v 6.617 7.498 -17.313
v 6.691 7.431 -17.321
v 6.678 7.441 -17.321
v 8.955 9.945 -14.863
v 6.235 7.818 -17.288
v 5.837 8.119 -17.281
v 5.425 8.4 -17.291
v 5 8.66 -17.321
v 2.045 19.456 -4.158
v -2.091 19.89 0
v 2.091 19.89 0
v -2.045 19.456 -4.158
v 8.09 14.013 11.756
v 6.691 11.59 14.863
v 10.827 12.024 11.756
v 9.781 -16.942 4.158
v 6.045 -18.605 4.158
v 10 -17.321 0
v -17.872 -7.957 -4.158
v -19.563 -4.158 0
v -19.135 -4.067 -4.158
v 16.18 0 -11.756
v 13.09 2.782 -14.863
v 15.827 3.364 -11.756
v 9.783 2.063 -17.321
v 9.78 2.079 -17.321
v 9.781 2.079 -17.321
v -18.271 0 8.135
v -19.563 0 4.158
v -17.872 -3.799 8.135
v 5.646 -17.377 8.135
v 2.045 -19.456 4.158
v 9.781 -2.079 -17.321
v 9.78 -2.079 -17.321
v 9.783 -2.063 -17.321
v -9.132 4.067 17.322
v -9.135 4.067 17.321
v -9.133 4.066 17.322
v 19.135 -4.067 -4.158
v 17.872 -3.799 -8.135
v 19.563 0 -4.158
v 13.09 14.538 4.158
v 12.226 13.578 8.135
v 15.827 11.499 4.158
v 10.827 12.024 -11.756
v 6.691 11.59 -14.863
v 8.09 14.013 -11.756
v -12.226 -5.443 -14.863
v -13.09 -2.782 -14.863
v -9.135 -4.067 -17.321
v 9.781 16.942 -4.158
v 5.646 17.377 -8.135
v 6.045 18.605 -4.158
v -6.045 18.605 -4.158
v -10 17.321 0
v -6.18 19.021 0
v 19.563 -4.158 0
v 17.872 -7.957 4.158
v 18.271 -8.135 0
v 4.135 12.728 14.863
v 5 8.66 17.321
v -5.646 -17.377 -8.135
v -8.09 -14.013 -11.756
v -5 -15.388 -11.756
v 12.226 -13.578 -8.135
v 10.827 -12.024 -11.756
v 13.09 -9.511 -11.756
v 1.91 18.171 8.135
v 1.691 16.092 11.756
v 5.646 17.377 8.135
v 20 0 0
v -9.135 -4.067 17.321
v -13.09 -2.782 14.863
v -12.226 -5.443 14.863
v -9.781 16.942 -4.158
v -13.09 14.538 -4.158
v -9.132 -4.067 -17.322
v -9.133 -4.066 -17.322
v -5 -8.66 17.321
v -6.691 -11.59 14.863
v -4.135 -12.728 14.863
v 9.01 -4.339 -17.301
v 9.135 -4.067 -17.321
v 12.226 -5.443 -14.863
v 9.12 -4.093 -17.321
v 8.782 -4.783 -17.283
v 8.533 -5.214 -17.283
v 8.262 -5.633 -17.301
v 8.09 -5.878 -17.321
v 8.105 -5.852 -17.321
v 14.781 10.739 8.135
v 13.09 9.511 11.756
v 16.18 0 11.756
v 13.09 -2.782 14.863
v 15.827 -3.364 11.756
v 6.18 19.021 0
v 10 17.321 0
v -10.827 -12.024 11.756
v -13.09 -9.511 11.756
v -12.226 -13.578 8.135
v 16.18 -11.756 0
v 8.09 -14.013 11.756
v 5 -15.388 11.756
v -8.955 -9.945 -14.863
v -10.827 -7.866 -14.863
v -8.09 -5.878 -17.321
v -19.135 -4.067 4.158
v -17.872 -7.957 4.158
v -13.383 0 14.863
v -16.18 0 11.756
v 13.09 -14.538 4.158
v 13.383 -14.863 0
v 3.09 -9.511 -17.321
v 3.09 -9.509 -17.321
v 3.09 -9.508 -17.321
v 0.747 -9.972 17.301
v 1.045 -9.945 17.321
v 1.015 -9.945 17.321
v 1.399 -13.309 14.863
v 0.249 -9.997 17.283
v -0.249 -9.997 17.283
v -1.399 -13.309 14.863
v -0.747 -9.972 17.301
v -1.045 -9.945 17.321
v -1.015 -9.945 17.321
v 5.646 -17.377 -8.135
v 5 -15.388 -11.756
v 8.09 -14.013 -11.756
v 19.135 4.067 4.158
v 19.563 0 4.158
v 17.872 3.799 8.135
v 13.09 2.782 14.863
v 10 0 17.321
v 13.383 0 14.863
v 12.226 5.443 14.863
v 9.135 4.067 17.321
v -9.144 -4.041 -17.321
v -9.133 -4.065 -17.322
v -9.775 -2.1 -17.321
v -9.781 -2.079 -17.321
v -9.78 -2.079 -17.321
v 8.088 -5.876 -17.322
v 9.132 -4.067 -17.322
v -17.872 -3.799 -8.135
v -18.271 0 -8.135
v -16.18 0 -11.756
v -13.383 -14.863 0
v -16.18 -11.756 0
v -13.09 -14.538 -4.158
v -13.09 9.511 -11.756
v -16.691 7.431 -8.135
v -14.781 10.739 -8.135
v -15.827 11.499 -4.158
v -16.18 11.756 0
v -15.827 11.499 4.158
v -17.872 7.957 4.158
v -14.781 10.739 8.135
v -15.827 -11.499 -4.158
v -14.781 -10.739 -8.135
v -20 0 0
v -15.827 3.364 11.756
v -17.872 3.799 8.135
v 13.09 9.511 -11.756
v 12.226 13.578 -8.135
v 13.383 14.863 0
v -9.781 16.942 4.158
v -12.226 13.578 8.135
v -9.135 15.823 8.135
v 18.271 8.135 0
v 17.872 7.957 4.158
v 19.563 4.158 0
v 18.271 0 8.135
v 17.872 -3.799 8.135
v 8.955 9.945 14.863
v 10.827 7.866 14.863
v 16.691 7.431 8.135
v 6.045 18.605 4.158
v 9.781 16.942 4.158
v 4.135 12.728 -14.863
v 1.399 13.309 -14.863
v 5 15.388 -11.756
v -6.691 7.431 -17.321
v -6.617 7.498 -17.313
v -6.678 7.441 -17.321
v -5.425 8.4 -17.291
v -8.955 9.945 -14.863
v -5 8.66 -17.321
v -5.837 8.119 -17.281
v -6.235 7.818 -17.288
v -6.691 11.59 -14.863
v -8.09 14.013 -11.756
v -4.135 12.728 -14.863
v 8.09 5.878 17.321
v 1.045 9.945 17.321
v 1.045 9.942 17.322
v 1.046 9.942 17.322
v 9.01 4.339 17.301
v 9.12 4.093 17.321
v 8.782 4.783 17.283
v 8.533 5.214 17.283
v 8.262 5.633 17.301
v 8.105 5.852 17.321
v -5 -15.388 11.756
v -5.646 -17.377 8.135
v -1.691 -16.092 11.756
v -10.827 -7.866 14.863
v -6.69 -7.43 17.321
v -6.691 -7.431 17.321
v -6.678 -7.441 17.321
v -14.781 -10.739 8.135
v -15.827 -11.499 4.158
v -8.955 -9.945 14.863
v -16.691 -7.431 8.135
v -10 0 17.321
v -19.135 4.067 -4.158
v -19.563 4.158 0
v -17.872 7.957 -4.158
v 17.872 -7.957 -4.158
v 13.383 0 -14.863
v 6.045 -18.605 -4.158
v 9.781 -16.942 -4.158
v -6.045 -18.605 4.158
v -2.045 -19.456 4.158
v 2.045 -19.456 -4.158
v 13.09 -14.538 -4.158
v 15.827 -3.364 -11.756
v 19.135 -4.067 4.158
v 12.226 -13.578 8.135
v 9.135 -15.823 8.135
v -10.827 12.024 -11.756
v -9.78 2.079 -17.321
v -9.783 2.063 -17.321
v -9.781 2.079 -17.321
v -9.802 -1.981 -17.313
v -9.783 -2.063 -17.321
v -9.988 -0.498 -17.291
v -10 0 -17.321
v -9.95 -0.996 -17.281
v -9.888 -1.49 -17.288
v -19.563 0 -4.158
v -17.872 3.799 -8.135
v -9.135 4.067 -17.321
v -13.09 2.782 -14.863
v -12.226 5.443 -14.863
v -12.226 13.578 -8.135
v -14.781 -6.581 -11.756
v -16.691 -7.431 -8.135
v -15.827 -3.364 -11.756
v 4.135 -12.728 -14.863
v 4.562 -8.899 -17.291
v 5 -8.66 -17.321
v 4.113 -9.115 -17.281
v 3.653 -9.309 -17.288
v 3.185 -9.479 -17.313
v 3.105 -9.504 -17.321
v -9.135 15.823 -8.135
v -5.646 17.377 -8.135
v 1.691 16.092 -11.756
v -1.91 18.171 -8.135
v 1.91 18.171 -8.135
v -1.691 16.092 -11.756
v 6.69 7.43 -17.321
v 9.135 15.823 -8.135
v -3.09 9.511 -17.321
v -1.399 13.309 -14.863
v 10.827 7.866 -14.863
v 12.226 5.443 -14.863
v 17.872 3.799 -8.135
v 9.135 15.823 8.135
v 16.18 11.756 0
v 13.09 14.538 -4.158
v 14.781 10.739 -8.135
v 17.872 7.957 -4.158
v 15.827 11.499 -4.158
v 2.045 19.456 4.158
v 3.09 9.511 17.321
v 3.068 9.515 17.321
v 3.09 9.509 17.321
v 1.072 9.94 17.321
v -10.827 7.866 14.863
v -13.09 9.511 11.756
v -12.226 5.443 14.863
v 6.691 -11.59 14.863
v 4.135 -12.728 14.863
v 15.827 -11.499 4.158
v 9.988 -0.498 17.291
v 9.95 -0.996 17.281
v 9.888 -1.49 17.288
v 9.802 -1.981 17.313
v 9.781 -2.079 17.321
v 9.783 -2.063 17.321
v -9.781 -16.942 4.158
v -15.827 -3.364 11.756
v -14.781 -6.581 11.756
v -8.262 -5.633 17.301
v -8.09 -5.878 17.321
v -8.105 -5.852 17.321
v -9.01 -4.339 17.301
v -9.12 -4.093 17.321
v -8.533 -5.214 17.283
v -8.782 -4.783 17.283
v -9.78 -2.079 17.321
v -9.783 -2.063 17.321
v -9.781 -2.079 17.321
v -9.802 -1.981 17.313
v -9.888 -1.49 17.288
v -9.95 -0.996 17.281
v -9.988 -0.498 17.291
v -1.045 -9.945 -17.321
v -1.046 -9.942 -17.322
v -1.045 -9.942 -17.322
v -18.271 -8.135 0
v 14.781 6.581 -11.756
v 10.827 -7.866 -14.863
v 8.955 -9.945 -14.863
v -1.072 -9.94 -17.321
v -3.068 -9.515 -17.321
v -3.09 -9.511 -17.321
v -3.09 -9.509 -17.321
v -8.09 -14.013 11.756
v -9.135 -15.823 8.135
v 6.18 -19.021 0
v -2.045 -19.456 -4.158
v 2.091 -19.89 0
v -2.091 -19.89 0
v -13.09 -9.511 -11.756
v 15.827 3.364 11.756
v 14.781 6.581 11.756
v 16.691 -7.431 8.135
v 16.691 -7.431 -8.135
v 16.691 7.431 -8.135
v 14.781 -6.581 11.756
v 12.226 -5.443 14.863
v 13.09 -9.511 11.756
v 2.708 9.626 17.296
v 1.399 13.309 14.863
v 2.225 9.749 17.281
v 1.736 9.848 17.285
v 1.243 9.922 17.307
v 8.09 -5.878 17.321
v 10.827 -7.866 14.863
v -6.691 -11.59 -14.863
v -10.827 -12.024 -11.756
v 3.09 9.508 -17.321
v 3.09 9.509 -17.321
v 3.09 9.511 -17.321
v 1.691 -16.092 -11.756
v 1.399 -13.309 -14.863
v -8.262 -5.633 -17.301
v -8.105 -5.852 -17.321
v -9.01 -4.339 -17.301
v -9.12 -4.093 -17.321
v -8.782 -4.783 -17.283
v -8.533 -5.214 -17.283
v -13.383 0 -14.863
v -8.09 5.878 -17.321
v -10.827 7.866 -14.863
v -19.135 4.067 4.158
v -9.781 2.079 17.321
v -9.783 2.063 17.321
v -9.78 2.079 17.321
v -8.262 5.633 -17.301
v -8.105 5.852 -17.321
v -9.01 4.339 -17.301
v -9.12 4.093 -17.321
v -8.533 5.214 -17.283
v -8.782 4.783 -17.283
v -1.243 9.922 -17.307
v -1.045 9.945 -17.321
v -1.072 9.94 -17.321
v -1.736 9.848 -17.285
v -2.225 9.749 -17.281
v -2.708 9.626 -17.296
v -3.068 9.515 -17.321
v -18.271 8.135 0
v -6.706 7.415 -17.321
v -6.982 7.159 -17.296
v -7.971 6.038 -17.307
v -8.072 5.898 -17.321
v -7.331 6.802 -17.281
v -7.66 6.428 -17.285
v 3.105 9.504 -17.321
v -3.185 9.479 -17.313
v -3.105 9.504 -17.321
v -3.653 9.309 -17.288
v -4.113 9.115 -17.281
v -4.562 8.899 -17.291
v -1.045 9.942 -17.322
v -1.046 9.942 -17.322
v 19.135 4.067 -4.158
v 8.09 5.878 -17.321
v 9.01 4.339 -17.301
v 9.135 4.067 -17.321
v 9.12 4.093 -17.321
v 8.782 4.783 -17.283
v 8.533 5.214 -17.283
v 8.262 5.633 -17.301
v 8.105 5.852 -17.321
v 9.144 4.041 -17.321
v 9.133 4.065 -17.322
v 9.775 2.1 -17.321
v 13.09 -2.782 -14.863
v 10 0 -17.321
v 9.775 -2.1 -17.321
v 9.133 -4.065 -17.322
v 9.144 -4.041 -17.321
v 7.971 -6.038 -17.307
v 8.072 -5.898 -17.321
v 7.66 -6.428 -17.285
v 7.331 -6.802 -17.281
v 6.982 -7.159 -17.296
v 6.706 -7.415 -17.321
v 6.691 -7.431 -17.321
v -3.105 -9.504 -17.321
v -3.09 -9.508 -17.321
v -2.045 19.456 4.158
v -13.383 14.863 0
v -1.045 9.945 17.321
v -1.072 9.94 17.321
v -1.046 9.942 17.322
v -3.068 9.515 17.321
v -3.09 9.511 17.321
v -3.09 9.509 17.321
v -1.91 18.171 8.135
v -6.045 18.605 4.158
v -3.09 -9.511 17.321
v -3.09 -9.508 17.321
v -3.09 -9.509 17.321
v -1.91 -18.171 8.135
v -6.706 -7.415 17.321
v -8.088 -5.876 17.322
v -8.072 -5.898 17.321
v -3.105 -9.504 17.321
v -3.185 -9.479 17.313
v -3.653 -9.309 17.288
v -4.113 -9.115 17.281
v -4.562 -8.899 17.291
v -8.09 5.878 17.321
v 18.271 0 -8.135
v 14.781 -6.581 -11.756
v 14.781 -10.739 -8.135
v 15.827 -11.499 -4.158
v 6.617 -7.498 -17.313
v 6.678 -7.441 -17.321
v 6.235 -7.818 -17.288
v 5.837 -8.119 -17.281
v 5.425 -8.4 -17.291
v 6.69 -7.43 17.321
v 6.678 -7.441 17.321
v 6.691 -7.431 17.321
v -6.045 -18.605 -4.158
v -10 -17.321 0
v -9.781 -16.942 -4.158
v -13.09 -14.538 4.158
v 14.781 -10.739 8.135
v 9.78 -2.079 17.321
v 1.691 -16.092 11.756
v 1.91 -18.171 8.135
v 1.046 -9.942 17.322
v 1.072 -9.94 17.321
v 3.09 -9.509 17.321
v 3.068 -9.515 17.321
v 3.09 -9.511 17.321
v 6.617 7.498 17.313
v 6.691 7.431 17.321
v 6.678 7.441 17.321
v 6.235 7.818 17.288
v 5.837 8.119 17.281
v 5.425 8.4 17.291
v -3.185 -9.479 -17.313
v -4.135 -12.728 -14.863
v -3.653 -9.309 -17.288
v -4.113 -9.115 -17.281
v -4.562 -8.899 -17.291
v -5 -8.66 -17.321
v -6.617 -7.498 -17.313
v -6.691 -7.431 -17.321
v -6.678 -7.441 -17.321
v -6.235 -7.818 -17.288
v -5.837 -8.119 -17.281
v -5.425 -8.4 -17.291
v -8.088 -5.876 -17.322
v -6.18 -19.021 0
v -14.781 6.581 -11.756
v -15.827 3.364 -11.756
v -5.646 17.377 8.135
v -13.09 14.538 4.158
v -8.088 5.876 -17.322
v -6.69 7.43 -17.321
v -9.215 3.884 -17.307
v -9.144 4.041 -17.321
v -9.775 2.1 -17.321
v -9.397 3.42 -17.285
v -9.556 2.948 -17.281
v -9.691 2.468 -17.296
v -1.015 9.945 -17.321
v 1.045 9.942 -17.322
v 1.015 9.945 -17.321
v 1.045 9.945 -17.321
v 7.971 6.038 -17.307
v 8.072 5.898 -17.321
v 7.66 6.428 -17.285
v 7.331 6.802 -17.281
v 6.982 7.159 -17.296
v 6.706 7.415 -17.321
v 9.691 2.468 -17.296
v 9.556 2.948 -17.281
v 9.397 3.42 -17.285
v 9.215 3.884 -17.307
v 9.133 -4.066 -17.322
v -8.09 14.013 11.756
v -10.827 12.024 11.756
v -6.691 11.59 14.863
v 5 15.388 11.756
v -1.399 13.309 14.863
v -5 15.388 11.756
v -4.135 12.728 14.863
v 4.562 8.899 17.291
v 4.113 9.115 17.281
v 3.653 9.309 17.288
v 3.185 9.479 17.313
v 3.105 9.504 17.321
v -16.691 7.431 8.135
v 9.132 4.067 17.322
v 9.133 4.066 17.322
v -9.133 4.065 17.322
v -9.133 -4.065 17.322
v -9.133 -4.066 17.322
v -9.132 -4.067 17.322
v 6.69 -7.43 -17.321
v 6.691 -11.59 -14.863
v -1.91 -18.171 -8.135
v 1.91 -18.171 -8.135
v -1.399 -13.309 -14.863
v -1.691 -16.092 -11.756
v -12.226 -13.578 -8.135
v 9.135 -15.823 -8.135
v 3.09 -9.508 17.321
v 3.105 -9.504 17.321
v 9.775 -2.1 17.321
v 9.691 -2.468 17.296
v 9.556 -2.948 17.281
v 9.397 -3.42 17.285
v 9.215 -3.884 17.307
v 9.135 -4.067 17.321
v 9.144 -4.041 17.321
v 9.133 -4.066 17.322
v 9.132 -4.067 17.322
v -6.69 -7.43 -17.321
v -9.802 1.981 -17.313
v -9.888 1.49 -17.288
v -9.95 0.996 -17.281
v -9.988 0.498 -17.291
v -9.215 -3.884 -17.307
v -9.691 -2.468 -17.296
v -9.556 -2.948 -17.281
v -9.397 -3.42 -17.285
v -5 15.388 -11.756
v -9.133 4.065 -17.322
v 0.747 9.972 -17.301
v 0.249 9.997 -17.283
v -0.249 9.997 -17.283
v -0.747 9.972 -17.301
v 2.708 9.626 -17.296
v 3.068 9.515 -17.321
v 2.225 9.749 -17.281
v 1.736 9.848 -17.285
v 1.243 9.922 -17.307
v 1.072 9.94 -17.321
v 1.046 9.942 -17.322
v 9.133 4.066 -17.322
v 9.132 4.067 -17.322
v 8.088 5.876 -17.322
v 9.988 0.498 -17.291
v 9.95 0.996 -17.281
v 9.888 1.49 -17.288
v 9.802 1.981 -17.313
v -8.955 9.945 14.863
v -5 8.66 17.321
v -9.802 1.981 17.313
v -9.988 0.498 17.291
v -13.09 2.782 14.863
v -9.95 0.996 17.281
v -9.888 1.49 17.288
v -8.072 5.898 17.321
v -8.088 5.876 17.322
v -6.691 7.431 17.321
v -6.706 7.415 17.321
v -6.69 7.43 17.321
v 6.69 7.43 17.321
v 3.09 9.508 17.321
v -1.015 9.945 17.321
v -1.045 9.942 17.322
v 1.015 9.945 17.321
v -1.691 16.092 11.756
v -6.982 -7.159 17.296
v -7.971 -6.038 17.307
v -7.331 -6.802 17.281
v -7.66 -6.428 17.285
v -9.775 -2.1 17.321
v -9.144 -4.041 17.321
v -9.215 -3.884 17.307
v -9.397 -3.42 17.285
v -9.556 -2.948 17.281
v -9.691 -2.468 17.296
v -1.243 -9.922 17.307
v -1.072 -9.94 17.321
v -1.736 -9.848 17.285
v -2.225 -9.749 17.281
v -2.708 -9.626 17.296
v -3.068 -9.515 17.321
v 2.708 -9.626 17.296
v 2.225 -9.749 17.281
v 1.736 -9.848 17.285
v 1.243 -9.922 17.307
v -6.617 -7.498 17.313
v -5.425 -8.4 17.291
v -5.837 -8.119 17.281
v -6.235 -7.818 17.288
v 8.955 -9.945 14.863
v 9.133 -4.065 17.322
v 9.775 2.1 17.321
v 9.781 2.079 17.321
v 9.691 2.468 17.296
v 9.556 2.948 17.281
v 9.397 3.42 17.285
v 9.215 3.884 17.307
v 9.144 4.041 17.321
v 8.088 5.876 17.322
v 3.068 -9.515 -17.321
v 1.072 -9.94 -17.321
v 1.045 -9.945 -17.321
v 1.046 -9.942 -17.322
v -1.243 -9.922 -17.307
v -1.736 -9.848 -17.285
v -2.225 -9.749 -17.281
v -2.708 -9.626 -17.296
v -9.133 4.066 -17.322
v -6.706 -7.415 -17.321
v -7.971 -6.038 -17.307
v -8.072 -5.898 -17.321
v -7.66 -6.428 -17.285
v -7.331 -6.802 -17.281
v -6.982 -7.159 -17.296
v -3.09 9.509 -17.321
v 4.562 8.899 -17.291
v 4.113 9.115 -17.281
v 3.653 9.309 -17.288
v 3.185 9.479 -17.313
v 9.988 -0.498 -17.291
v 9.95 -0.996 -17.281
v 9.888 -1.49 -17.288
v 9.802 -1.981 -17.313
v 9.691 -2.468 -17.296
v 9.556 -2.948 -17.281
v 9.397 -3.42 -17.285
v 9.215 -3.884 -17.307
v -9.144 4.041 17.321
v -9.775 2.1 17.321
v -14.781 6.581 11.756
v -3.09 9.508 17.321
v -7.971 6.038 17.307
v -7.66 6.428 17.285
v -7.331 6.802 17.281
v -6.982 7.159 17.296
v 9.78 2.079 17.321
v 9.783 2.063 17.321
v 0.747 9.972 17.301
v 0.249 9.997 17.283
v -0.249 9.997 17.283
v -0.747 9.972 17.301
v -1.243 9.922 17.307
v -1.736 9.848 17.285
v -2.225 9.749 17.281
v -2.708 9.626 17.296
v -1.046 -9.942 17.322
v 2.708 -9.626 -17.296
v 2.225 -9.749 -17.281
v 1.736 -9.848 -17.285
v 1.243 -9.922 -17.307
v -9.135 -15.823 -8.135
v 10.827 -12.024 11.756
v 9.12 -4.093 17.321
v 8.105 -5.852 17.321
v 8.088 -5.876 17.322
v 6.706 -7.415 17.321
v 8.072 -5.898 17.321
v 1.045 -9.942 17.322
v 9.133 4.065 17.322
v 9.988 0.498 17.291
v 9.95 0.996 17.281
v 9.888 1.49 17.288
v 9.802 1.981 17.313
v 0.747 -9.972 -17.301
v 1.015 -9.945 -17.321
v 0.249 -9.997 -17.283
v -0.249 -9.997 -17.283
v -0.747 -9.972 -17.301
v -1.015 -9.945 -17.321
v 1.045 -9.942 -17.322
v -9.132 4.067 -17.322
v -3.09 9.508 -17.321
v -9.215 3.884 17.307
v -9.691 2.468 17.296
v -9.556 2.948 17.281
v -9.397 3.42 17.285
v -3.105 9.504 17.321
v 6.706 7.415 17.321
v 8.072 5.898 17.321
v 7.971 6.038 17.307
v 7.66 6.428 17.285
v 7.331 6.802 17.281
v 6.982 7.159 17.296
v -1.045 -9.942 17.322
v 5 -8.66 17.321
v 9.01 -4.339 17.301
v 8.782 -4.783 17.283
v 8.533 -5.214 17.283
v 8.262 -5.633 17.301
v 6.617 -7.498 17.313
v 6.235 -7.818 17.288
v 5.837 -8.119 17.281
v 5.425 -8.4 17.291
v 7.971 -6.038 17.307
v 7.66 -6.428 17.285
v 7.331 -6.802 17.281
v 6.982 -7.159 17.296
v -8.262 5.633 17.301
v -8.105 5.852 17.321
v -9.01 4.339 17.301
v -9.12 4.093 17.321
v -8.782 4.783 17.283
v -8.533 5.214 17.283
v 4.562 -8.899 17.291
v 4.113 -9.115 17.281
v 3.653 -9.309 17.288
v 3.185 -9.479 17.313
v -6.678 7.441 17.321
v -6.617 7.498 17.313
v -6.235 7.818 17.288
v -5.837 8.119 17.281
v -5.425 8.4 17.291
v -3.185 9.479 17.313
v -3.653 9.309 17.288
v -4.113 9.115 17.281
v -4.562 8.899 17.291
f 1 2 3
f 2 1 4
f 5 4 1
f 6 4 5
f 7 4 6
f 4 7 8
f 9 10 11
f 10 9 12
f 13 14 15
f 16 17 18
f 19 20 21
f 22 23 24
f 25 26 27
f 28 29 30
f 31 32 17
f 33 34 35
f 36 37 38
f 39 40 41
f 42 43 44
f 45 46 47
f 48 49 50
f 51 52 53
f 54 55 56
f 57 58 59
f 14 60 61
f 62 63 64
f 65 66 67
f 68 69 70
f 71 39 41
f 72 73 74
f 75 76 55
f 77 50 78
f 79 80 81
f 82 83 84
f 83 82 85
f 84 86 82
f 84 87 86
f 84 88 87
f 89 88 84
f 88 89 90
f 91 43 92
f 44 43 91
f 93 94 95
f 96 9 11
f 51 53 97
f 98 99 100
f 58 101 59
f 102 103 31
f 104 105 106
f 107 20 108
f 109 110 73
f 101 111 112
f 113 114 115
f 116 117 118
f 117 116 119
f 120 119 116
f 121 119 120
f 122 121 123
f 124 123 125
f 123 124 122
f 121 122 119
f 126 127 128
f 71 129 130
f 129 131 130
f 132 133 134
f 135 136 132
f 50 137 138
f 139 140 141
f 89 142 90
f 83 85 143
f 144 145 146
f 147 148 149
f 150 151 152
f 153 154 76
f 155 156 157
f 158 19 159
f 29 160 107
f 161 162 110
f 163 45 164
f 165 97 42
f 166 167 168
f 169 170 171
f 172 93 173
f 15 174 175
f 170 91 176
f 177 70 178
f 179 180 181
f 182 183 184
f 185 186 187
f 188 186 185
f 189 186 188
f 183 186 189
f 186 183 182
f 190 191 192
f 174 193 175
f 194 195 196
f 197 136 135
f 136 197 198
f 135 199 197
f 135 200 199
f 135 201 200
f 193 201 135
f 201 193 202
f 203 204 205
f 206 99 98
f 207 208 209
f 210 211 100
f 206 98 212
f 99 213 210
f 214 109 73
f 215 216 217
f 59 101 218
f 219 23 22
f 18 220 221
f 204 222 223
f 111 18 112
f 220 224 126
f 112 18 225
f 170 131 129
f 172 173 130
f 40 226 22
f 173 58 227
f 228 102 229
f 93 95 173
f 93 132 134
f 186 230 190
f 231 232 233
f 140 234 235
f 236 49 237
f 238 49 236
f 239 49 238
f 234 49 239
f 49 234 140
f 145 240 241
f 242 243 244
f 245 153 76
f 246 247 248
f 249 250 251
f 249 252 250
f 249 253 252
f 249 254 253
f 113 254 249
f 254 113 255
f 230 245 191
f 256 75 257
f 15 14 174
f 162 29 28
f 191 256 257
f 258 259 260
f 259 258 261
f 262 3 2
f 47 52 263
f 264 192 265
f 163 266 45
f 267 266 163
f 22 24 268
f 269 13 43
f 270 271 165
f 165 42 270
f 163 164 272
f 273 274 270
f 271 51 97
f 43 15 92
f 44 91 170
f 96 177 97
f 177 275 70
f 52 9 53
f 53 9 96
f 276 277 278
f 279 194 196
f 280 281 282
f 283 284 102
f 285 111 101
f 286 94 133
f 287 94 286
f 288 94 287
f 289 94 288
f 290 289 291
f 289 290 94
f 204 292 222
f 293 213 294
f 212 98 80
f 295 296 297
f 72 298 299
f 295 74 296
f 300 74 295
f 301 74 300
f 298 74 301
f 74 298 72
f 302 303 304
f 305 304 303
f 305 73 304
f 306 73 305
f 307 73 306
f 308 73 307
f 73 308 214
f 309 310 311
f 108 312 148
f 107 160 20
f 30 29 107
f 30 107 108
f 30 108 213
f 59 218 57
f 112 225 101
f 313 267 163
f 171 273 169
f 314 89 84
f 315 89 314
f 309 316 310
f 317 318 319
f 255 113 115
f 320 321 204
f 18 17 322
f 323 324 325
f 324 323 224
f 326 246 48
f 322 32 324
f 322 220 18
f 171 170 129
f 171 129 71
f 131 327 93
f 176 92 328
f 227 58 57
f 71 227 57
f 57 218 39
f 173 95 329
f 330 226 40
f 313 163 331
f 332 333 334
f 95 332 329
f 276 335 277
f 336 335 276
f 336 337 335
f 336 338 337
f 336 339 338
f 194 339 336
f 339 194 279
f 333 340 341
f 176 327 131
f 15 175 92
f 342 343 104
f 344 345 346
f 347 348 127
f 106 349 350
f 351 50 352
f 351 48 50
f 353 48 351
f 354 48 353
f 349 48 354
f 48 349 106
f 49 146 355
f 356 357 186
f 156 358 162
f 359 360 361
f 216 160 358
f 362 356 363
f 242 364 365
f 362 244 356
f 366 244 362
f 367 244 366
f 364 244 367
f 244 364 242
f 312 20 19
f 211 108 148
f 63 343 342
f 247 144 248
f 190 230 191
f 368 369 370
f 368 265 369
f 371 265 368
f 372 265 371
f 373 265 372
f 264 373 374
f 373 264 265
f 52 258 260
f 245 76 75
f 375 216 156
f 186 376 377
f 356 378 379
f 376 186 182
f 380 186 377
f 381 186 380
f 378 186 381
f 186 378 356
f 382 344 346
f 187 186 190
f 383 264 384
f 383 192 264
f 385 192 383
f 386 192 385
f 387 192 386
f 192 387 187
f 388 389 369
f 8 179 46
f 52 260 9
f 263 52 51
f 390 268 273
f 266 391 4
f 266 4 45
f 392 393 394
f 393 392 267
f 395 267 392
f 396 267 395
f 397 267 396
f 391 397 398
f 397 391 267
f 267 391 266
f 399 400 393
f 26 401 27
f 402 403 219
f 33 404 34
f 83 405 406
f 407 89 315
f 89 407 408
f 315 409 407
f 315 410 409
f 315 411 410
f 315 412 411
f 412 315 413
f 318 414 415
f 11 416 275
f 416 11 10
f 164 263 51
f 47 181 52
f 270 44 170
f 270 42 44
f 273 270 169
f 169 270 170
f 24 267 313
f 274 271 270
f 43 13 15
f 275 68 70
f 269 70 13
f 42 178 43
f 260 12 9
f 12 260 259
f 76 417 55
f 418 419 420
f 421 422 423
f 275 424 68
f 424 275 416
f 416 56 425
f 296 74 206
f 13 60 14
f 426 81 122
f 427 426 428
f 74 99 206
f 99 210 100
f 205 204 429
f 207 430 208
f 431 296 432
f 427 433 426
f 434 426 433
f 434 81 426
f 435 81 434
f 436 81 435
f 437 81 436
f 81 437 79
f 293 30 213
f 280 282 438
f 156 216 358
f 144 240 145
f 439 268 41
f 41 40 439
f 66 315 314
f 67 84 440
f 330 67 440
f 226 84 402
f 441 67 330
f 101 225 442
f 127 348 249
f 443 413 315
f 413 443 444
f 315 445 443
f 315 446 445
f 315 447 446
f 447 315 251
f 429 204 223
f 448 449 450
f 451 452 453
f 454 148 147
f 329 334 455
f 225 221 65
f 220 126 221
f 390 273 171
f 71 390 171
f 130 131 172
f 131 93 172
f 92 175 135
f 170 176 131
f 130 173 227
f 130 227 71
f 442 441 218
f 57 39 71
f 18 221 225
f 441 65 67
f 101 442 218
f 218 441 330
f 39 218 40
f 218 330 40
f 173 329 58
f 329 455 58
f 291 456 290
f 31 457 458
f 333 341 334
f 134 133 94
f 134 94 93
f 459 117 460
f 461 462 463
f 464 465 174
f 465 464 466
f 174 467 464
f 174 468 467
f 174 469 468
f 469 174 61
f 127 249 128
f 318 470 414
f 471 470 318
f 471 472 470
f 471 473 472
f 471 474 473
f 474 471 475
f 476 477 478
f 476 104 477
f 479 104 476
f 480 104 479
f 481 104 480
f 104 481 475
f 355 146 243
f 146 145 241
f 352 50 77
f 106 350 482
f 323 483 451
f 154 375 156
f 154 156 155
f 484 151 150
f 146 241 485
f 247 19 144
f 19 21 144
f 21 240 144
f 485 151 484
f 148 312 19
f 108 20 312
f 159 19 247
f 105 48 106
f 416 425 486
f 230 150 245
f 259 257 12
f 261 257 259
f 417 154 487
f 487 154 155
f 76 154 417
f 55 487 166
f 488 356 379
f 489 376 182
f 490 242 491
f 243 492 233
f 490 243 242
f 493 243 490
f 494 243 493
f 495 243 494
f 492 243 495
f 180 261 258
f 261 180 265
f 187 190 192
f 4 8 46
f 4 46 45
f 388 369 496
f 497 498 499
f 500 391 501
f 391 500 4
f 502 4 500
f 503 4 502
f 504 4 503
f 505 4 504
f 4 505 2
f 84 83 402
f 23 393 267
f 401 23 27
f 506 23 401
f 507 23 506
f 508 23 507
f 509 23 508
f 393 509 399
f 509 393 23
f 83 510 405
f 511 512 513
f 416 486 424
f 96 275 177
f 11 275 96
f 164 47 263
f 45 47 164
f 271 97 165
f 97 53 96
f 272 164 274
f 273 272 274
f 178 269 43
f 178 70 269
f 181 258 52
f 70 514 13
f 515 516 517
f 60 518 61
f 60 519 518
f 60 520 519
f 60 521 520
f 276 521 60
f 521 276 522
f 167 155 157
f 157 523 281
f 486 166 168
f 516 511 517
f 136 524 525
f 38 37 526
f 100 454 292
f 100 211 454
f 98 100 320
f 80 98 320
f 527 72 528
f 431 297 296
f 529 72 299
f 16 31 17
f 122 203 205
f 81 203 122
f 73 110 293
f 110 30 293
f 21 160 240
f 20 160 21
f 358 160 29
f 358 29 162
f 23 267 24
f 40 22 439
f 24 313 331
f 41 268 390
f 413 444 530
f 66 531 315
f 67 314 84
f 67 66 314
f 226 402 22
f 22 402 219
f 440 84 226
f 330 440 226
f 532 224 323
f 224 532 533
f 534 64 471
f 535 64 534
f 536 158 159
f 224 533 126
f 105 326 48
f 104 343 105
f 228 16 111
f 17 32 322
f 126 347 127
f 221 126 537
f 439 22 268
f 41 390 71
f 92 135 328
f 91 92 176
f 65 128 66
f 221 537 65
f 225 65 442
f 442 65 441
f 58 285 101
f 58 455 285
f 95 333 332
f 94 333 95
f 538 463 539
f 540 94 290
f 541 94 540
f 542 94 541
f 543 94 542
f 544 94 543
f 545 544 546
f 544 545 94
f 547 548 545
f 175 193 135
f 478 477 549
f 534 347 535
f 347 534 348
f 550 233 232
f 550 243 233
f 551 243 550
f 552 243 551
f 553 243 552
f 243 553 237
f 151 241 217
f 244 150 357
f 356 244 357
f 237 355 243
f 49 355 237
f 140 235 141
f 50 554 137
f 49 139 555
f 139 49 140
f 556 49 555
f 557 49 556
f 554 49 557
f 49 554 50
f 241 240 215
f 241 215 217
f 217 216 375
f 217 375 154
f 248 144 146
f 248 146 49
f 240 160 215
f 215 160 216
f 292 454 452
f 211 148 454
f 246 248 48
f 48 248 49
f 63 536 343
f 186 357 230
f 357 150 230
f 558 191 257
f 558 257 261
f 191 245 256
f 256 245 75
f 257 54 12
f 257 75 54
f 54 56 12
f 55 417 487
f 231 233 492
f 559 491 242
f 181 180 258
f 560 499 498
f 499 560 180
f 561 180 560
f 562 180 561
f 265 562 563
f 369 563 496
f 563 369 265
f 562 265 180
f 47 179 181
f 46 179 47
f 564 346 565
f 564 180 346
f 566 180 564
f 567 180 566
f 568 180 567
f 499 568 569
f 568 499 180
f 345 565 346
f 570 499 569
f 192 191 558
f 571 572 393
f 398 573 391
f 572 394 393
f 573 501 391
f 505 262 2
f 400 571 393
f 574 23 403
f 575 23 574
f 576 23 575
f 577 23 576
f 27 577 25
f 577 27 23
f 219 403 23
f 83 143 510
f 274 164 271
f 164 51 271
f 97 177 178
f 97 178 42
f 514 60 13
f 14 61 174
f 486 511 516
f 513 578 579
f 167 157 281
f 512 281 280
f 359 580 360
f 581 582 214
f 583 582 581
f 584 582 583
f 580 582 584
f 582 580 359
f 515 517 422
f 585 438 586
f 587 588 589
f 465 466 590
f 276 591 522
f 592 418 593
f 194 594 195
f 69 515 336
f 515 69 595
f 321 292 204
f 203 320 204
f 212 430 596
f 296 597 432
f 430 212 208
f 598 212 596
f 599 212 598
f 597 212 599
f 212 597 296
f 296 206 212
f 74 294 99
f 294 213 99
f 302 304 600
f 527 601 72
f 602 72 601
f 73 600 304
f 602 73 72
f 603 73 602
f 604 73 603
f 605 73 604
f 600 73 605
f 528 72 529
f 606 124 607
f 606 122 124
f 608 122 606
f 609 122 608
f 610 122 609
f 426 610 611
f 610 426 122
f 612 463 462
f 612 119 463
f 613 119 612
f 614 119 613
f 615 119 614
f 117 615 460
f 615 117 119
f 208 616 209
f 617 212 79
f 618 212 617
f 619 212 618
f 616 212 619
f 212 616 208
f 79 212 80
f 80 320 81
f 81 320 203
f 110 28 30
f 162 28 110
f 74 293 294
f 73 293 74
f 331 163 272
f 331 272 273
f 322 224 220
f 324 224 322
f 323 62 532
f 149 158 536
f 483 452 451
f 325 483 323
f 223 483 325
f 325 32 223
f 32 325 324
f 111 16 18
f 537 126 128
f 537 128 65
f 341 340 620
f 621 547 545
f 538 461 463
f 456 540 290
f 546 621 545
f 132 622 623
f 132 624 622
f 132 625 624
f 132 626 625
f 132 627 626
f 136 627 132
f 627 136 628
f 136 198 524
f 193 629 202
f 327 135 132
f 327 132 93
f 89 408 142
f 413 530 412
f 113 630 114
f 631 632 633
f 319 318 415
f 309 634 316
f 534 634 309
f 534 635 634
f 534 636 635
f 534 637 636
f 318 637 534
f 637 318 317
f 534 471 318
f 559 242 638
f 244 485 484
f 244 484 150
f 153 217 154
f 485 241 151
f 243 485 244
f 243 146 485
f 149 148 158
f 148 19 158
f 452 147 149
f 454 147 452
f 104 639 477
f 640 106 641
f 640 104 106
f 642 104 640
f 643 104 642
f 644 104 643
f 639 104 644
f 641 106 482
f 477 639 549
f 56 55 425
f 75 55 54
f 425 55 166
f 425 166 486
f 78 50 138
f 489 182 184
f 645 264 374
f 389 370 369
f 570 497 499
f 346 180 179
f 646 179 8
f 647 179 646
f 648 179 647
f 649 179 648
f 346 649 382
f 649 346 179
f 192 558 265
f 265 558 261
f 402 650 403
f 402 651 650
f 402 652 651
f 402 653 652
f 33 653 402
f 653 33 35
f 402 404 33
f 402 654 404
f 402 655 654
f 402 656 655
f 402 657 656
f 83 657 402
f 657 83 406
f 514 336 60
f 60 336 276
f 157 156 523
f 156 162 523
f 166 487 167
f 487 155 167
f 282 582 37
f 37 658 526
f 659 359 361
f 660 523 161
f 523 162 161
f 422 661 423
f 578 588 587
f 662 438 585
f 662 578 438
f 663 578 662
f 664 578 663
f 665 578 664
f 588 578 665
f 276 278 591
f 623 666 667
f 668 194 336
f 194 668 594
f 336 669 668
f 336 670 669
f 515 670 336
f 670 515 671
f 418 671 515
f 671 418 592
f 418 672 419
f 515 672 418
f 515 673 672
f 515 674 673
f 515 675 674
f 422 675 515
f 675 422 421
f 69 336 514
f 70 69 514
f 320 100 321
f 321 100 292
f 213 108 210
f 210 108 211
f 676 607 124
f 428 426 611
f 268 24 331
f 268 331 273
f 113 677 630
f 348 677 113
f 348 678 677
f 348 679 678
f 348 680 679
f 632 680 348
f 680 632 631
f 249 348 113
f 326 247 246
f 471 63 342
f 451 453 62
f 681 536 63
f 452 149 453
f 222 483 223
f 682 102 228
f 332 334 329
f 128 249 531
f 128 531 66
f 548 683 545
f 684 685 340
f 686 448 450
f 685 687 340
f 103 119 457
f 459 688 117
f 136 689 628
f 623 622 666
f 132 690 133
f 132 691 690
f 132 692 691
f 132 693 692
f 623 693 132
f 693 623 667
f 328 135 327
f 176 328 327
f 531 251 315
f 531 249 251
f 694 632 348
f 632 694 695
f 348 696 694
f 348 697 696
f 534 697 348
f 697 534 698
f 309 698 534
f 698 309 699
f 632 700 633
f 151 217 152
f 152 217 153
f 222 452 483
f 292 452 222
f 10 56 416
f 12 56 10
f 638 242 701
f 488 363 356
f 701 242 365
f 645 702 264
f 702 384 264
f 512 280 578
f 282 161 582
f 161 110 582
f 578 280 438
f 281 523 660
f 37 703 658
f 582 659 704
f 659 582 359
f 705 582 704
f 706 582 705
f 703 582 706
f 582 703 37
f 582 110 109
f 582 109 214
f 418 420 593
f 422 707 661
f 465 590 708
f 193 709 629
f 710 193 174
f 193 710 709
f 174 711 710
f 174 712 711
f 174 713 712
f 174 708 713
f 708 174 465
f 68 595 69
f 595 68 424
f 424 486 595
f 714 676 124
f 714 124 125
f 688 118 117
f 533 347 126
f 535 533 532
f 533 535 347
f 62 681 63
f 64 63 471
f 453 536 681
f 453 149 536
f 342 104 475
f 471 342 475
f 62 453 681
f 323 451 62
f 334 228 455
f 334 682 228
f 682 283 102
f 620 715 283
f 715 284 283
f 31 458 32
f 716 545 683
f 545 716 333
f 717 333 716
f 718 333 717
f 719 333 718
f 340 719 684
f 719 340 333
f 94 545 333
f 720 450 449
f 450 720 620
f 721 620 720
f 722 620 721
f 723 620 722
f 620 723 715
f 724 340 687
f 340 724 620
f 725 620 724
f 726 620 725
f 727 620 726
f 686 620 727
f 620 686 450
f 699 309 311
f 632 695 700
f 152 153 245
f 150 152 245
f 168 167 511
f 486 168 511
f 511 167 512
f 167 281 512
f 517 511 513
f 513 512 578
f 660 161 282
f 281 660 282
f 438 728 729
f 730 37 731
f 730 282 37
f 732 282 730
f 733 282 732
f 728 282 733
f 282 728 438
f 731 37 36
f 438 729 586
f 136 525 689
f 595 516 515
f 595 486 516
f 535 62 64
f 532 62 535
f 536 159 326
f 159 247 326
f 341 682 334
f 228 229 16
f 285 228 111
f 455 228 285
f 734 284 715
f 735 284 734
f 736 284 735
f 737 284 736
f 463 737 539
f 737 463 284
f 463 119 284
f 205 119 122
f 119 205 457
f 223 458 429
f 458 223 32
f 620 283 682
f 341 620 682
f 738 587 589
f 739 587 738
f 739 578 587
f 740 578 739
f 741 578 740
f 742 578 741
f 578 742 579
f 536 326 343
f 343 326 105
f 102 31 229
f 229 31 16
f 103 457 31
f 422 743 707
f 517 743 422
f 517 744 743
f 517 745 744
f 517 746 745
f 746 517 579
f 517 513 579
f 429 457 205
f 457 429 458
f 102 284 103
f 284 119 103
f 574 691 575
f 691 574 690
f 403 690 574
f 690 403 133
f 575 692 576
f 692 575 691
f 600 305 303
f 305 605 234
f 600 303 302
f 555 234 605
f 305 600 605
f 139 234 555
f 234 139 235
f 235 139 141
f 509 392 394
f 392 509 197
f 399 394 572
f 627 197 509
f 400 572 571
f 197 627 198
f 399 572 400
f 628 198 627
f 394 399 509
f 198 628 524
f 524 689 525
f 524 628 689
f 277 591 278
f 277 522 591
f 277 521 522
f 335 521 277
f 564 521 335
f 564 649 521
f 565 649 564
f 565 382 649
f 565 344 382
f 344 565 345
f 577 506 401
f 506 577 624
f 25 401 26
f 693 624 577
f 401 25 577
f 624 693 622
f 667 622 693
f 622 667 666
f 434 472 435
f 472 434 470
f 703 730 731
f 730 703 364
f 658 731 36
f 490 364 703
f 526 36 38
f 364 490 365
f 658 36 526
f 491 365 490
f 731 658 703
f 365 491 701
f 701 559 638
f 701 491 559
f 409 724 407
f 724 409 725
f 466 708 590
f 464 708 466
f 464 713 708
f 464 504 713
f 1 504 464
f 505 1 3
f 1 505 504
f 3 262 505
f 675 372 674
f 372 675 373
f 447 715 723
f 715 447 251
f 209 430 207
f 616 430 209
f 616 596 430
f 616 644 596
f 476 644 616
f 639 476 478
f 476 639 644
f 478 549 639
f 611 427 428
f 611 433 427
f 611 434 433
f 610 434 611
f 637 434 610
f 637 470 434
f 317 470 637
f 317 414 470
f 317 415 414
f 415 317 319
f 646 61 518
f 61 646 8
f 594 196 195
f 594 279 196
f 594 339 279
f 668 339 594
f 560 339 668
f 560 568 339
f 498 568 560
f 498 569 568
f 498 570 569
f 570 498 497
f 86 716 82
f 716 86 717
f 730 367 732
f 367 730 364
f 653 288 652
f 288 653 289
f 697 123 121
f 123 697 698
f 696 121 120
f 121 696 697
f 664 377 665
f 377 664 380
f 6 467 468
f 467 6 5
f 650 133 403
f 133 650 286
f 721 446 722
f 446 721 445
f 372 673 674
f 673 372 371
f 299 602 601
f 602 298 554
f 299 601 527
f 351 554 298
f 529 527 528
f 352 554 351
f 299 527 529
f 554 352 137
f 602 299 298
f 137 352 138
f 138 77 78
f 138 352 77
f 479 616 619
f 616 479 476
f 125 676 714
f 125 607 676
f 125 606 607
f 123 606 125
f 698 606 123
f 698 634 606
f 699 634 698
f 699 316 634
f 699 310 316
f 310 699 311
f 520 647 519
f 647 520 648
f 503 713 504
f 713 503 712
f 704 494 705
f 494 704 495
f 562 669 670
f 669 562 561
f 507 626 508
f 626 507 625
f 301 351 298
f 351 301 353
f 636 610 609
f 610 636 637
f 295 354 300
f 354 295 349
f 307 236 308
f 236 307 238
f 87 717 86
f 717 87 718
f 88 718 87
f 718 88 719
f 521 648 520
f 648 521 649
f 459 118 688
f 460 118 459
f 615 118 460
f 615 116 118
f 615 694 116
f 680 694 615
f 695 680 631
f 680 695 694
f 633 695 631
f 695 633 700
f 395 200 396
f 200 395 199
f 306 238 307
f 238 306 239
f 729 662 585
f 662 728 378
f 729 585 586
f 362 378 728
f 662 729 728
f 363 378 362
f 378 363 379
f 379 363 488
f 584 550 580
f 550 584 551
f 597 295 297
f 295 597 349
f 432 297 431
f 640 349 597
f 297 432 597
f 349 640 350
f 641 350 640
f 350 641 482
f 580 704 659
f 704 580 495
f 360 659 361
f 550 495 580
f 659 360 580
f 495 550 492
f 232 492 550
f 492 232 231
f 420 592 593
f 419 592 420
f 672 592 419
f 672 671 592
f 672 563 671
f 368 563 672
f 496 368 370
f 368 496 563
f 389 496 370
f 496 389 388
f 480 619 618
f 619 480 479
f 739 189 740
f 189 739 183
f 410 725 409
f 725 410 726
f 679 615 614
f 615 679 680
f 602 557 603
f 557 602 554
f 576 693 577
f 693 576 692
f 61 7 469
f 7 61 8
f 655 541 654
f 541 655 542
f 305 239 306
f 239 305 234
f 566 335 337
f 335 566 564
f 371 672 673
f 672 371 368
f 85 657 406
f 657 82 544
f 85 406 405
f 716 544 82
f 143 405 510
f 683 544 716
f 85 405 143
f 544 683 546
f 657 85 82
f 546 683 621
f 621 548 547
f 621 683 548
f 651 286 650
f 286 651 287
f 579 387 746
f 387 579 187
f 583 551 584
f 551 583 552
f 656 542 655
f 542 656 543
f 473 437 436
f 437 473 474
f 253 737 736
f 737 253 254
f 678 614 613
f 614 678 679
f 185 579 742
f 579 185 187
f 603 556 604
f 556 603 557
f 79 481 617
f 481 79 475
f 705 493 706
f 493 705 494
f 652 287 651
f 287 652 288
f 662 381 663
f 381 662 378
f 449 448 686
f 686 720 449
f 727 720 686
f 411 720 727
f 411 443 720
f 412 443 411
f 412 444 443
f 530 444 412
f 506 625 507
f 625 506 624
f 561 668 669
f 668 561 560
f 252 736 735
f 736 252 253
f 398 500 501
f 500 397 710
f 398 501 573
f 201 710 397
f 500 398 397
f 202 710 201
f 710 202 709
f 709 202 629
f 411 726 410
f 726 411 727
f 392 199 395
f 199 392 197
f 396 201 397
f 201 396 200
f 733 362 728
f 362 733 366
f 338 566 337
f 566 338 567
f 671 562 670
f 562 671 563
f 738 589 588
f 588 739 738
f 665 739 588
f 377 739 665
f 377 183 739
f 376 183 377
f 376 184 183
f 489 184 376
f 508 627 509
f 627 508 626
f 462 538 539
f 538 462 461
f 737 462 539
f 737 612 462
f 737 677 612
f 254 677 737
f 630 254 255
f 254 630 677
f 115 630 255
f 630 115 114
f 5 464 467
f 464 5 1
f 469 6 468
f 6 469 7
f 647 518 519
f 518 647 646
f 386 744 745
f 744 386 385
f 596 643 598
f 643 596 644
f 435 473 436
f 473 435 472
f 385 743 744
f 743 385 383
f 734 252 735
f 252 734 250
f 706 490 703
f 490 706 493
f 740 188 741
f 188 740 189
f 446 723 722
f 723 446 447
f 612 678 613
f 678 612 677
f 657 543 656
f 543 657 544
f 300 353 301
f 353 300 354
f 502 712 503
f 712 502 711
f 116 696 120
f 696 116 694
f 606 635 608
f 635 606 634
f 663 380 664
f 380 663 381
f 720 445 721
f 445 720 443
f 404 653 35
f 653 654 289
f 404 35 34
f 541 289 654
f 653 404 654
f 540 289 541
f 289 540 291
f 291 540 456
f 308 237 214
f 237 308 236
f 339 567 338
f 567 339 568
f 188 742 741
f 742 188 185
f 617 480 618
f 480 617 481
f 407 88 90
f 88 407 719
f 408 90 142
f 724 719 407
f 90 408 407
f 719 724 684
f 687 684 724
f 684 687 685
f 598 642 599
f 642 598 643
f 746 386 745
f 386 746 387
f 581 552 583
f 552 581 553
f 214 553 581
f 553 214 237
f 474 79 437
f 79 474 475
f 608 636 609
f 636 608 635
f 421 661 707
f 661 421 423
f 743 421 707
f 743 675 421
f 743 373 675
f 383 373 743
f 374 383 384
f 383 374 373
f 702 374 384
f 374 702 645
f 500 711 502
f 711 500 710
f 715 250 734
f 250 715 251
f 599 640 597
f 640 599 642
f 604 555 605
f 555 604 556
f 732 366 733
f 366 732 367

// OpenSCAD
difference(){
sphere(r=20,center=true);
#cylinder(h=50,center=true,$fa=0.5,$fs=0.5,r=10);
}
